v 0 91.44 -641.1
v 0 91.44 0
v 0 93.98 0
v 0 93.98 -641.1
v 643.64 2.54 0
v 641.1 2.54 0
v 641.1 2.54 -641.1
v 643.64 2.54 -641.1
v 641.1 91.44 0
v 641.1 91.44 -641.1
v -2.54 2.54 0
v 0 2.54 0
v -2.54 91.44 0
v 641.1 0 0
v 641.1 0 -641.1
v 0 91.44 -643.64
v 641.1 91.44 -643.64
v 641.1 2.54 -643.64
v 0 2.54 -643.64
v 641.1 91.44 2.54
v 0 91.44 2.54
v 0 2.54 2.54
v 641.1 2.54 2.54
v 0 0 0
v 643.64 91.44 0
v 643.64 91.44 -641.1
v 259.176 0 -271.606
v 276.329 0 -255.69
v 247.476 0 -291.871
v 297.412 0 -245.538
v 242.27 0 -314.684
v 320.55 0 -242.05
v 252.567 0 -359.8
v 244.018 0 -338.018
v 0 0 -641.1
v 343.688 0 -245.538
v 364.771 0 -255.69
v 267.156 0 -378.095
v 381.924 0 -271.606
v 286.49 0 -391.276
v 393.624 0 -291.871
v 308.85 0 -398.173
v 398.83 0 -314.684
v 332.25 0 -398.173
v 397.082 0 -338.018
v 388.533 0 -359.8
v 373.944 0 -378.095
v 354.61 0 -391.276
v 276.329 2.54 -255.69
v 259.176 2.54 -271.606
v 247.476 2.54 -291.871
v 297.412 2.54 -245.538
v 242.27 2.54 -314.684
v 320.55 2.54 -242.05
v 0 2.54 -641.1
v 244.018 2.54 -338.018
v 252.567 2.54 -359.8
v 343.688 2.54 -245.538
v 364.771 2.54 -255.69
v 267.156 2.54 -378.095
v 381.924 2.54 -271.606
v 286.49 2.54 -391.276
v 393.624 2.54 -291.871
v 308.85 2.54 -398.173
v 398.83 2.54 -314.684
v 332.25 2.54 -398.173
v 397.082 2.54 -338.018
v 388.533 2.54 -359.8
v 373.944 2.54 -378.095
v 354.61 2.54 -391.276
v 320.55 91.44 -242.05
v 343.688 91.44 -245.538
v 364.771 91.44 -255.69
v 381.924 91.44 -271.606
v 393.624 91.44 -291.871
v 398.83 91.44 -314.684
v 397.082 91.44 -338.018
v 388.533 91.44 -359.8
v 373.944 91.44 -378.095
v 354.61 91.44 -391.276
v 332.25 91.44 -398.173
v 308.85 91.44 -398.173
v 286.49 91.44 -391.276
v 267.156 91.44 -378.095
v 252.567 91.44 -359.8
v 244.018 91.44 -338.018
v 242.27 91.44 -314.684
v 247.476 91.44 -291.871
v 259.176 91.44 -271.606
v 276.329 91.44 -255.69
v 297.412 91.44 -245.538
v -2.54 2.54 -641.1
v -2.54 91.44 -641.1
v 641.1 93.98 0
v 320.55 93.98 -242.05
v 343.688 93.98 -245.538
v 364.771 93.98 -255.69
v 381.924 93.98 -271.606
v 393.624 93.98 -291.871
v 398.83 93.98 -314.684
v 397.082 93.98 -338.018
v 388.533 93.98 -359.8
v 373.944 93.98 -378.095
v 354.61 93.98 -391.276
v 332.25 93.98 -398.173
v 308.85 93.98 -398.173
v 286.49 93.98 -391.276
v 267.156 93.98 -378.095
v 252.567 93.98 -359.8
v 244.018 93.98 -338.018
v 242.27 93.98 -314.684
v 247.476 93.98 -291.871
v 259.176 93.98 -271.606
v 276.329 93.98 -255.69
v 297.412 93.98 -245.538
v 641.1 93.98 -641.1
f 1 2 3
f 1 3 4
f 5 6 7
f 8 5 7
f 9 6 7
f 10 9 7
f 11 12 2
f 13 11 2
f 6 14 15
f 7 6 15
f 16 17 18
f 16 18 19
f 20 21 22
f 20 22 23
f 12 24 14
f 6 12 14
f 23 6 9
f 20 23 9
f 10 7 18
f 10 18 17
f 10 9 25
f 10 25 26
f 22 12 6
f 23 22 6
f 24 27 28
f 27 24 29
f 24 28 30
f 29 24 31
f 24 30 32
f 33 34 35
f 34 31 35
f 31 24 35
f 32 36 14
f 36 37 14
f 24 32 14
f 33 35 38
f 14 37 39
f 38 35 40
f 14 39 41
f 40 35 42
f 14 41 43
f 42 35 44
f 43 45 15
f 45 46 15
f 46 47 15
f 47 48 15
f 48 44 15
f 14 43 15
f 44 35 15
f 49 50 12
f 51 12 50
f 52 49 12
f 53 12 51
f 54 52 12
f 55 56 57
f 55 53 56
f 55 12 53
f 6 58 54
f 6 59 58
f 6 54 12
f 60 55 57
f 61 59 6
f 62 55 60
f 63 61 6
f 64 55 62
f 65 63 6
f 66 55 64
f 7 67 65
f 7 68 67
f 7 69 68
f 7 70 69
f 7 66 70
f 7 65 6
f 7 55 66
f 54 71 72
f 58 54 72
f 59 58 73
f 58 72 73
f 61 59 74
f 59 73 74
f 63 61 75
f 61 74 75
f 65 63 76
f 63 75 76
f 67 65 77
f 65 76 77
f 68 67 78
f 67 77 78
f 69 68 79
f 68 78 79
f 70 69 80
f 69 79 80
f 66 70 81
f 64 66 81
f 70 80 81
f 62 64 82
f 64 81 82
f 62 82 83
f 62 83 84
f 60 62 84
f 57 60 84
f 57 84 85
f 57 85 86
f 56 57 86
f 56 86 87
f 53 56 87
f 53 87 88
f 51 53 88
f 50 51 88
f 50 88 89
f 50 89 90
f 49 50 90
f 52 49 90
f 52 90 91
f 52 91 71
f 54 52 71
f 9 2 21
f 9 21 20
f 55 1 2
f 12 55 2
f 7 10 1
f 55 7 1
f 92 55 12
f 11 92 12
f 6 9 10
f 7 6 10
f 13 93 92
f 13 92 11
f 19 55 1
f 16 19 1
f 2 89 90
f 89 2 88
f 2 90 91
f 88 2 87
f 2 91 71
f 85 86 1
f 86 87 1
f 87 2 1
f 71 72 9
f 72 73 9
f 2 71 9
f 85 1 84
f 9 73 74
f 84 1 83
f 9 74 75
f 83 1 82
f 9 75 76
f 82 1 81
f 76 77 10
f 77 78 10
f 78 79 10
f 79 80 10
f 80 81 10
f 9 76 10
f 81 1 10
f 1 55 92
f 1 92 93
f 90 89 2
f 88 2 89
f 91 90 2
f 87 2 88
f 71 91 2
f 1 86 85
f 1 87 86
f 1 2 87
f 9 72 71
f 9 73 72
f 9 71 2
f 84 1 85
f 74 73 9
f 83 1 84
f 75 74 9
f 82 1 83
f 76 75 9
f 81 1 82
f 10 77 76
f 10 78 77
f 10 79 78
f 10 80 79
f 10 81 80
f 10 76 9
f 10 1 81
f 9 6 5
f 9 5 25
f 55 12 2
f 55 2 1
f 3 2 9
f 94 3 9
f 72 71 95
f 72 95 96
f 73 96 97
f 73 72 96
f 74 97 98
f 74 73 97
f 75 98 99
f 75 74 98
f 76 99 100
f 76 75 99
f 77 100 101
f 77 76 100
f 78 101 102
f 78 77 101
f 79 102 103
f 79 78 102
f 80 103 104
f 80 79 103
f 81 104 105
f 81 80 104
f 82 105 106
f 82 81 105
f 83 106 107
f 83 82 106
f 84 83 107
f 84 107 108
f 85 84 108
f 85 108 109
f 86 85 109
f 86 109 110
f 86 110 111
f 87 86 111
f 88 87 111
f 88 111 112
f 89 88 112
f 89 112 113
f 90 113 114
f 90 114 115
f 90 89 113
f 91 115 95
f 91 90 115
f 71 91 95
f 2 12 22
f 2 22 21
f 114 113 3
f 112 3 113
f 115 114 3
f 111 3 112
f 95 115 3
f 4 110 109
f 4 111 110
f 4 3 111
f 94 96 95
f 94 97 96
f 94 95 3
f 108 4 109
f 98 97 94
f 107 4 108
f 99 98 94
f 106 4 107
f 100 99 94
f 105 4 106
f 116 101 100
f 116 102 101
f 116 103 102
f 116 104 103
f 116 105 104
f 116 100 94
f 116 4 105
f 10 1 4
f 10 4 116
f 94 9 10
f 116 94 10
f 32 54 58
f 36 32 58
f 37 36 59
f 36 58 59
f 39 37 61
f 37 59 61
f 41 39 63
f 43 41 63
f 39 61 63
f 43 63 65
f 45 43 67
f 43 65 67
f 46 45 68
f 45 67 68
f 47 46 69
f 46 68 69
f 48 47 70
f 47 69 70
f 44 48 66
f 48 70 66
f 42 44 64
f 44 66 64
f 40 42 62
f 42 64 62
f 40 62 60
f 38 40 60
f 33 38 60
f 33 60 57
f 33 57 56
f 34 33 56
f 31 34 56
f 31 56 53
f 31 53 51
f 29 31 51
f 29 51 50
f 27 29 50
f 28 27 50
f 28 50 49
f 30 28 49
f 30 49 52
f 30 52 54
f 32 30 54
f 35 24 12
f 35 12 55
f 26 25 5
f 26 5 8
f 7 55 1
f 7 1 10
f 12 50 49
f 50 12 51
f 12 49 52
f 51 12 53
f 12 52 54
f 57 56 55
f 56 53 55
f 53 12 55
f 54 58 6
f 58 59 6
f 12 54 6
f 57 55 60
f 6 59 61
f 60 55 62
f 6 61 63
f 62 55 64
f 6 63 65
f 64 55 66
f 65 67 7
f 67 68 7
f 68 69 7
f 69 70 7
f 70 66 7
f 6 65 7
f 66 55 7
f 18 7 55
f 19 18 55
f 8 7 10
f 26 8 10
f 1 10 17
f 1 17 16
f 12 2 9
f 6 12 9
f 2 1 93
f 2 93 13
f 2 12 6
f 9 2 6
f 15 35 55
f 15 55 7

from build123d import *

# Parameters (mm, degrees)
SKETCH1_W           = 641.1
SKETCH1_H           = 641.1
BOSS_EXTRUDE1_DEPTH = 2.54
SKETCH2_W           = 641.1
SKETCH2_H           = 641.1
BOSS_EXTRUDE2_DEPTH = 88.9
SKETCH3_W           = 641.1
SKETCH3_H           = 88.9
BOSS_EXTRUDE3_DEPTH = 2.54
CIRPATTERN1_COUNT   = 4
SKETCH5_R           = 78.5
CUT_EXTRUDE1_DEPTH  = 915.825760897
SKETCH7_W           = 641.1
SKETCH7_H           = 641.1
SKETCH7_R           = 78.5
BOSS_EXTRUDE4_DEPTH = 2.54


with BuildPart() as part:
    # Sketch1 → Boss-Extrude1 (new body)
    with BuildSketch(Plane(origin=(0, 0, 0), x_dir=(1, 0, 0), z_dir=(0, 1, 0))):
        with Locations((320.55, 320.55)):
            Rectangle(SKETCH1_W, SKETCH1_H)
    extrude(amount=BOSS_EXTRUDE1_DEPTH)


with BuildPart() as body_2:
    # Sketch2 → Boss-Extrude2 (new body)
    with BuildSketch(Plane(origin=(0, 2.54, 0), x_dir=(1, 0, 0), z_dir=(0, 1, 0))):
        with Locations((320.55, 320.55)):
            Rectangle(SKETCH2_W, SKETCH2_H)
    extrude(amount=BOSS_EXTRUDE2_DEPTH)


with BuildPart() as body_3:
    # Sketch3 → Boss-Extrude3 (new body)
    with BuildSketch(Plane.XY):
        with Locations((320.55, 46.99)):
            Rectangle(SKETCH3_W, SKETCH3_H)
    extrude(amount=BOSS_EXTRUDE3_DEPTH)


with BuildPart() as cirpattern1_1:
    # CirPattern1: pattern copy
    add(body_3.part.rotate(Axis((320.55, 91.44, -320.55), (0, 1, 0)), 1 * 360 / CIRPATTERN1_COUNT))


with BuildPart() as cirpattern1_2:
    # CirPattern1: pattern copy
    add(body_3.part.rotate(Axis((320.55, 91.44, -320.55), (0, 1, 0)), 2 * 360 / CIRPATTERN1_COUNT))


with BuildPart() as cirpattern1_3:
    # CirPattern1: pattern copy
    add(body_3.part.rotate(Axis((320.55, 91.44, -320.55), (0, 1, 0)), 3 * 360 / CIRPATTERN1_COUNT))


with BuildPart() as cut_extrude1_tool:
    # Sketch5 → Cut-Extrude1 (new, through all)
    with BuildSketch(Plane(origin=(0, 91.44, 0), x_dir=(1, 0, 0), z_dir=(0, 1, 0))):
        with Locations((320.55, 320.55)):
            Circle(SKETCH5_R)
    extrude(amount=-CUT_EXTRUDE1_DEPTH)


with BuildPart() as part_1:
    add(part.part)

    # Cut-Extrude1: cut by cut_extrude1_tool
    add(cut_extrude1_tool.part, mode=Mode.SUBTRACT)


with BuildPart() as body_2_1:
    add(body_2.part)

    # Cut-Extrude1: cut by cut_extrude1_tool
    add(cut_extrude1_tool.part, mode=Mode.SUBTRACT)


with BuildPart() as body_7:
    # Sketch7 → Boss-Extrude4 (new body)
    with BuildSketch(Plane(origin=(0, 91.44, 0), x_dir=(1, 0, 0), z_dir=(0, 1, 0))):
        with Locations((320.55, 320.55)):
            Rectangle(SKETCH7_W, SKETCH7_H)
        with Locations((320.55, 320.55)):
            Circle(SKETCH7_R, mode=Mode.SUBTRACT)
    extrude(amount=BOSS_EXTRUDE4_DEPTH)


solid = Compound([body_3.part, cirpattern1_1.part, cirpattern1_2.part, cirpattern1_3.part, part_1.part, body_2_1.part, body_7.part])
